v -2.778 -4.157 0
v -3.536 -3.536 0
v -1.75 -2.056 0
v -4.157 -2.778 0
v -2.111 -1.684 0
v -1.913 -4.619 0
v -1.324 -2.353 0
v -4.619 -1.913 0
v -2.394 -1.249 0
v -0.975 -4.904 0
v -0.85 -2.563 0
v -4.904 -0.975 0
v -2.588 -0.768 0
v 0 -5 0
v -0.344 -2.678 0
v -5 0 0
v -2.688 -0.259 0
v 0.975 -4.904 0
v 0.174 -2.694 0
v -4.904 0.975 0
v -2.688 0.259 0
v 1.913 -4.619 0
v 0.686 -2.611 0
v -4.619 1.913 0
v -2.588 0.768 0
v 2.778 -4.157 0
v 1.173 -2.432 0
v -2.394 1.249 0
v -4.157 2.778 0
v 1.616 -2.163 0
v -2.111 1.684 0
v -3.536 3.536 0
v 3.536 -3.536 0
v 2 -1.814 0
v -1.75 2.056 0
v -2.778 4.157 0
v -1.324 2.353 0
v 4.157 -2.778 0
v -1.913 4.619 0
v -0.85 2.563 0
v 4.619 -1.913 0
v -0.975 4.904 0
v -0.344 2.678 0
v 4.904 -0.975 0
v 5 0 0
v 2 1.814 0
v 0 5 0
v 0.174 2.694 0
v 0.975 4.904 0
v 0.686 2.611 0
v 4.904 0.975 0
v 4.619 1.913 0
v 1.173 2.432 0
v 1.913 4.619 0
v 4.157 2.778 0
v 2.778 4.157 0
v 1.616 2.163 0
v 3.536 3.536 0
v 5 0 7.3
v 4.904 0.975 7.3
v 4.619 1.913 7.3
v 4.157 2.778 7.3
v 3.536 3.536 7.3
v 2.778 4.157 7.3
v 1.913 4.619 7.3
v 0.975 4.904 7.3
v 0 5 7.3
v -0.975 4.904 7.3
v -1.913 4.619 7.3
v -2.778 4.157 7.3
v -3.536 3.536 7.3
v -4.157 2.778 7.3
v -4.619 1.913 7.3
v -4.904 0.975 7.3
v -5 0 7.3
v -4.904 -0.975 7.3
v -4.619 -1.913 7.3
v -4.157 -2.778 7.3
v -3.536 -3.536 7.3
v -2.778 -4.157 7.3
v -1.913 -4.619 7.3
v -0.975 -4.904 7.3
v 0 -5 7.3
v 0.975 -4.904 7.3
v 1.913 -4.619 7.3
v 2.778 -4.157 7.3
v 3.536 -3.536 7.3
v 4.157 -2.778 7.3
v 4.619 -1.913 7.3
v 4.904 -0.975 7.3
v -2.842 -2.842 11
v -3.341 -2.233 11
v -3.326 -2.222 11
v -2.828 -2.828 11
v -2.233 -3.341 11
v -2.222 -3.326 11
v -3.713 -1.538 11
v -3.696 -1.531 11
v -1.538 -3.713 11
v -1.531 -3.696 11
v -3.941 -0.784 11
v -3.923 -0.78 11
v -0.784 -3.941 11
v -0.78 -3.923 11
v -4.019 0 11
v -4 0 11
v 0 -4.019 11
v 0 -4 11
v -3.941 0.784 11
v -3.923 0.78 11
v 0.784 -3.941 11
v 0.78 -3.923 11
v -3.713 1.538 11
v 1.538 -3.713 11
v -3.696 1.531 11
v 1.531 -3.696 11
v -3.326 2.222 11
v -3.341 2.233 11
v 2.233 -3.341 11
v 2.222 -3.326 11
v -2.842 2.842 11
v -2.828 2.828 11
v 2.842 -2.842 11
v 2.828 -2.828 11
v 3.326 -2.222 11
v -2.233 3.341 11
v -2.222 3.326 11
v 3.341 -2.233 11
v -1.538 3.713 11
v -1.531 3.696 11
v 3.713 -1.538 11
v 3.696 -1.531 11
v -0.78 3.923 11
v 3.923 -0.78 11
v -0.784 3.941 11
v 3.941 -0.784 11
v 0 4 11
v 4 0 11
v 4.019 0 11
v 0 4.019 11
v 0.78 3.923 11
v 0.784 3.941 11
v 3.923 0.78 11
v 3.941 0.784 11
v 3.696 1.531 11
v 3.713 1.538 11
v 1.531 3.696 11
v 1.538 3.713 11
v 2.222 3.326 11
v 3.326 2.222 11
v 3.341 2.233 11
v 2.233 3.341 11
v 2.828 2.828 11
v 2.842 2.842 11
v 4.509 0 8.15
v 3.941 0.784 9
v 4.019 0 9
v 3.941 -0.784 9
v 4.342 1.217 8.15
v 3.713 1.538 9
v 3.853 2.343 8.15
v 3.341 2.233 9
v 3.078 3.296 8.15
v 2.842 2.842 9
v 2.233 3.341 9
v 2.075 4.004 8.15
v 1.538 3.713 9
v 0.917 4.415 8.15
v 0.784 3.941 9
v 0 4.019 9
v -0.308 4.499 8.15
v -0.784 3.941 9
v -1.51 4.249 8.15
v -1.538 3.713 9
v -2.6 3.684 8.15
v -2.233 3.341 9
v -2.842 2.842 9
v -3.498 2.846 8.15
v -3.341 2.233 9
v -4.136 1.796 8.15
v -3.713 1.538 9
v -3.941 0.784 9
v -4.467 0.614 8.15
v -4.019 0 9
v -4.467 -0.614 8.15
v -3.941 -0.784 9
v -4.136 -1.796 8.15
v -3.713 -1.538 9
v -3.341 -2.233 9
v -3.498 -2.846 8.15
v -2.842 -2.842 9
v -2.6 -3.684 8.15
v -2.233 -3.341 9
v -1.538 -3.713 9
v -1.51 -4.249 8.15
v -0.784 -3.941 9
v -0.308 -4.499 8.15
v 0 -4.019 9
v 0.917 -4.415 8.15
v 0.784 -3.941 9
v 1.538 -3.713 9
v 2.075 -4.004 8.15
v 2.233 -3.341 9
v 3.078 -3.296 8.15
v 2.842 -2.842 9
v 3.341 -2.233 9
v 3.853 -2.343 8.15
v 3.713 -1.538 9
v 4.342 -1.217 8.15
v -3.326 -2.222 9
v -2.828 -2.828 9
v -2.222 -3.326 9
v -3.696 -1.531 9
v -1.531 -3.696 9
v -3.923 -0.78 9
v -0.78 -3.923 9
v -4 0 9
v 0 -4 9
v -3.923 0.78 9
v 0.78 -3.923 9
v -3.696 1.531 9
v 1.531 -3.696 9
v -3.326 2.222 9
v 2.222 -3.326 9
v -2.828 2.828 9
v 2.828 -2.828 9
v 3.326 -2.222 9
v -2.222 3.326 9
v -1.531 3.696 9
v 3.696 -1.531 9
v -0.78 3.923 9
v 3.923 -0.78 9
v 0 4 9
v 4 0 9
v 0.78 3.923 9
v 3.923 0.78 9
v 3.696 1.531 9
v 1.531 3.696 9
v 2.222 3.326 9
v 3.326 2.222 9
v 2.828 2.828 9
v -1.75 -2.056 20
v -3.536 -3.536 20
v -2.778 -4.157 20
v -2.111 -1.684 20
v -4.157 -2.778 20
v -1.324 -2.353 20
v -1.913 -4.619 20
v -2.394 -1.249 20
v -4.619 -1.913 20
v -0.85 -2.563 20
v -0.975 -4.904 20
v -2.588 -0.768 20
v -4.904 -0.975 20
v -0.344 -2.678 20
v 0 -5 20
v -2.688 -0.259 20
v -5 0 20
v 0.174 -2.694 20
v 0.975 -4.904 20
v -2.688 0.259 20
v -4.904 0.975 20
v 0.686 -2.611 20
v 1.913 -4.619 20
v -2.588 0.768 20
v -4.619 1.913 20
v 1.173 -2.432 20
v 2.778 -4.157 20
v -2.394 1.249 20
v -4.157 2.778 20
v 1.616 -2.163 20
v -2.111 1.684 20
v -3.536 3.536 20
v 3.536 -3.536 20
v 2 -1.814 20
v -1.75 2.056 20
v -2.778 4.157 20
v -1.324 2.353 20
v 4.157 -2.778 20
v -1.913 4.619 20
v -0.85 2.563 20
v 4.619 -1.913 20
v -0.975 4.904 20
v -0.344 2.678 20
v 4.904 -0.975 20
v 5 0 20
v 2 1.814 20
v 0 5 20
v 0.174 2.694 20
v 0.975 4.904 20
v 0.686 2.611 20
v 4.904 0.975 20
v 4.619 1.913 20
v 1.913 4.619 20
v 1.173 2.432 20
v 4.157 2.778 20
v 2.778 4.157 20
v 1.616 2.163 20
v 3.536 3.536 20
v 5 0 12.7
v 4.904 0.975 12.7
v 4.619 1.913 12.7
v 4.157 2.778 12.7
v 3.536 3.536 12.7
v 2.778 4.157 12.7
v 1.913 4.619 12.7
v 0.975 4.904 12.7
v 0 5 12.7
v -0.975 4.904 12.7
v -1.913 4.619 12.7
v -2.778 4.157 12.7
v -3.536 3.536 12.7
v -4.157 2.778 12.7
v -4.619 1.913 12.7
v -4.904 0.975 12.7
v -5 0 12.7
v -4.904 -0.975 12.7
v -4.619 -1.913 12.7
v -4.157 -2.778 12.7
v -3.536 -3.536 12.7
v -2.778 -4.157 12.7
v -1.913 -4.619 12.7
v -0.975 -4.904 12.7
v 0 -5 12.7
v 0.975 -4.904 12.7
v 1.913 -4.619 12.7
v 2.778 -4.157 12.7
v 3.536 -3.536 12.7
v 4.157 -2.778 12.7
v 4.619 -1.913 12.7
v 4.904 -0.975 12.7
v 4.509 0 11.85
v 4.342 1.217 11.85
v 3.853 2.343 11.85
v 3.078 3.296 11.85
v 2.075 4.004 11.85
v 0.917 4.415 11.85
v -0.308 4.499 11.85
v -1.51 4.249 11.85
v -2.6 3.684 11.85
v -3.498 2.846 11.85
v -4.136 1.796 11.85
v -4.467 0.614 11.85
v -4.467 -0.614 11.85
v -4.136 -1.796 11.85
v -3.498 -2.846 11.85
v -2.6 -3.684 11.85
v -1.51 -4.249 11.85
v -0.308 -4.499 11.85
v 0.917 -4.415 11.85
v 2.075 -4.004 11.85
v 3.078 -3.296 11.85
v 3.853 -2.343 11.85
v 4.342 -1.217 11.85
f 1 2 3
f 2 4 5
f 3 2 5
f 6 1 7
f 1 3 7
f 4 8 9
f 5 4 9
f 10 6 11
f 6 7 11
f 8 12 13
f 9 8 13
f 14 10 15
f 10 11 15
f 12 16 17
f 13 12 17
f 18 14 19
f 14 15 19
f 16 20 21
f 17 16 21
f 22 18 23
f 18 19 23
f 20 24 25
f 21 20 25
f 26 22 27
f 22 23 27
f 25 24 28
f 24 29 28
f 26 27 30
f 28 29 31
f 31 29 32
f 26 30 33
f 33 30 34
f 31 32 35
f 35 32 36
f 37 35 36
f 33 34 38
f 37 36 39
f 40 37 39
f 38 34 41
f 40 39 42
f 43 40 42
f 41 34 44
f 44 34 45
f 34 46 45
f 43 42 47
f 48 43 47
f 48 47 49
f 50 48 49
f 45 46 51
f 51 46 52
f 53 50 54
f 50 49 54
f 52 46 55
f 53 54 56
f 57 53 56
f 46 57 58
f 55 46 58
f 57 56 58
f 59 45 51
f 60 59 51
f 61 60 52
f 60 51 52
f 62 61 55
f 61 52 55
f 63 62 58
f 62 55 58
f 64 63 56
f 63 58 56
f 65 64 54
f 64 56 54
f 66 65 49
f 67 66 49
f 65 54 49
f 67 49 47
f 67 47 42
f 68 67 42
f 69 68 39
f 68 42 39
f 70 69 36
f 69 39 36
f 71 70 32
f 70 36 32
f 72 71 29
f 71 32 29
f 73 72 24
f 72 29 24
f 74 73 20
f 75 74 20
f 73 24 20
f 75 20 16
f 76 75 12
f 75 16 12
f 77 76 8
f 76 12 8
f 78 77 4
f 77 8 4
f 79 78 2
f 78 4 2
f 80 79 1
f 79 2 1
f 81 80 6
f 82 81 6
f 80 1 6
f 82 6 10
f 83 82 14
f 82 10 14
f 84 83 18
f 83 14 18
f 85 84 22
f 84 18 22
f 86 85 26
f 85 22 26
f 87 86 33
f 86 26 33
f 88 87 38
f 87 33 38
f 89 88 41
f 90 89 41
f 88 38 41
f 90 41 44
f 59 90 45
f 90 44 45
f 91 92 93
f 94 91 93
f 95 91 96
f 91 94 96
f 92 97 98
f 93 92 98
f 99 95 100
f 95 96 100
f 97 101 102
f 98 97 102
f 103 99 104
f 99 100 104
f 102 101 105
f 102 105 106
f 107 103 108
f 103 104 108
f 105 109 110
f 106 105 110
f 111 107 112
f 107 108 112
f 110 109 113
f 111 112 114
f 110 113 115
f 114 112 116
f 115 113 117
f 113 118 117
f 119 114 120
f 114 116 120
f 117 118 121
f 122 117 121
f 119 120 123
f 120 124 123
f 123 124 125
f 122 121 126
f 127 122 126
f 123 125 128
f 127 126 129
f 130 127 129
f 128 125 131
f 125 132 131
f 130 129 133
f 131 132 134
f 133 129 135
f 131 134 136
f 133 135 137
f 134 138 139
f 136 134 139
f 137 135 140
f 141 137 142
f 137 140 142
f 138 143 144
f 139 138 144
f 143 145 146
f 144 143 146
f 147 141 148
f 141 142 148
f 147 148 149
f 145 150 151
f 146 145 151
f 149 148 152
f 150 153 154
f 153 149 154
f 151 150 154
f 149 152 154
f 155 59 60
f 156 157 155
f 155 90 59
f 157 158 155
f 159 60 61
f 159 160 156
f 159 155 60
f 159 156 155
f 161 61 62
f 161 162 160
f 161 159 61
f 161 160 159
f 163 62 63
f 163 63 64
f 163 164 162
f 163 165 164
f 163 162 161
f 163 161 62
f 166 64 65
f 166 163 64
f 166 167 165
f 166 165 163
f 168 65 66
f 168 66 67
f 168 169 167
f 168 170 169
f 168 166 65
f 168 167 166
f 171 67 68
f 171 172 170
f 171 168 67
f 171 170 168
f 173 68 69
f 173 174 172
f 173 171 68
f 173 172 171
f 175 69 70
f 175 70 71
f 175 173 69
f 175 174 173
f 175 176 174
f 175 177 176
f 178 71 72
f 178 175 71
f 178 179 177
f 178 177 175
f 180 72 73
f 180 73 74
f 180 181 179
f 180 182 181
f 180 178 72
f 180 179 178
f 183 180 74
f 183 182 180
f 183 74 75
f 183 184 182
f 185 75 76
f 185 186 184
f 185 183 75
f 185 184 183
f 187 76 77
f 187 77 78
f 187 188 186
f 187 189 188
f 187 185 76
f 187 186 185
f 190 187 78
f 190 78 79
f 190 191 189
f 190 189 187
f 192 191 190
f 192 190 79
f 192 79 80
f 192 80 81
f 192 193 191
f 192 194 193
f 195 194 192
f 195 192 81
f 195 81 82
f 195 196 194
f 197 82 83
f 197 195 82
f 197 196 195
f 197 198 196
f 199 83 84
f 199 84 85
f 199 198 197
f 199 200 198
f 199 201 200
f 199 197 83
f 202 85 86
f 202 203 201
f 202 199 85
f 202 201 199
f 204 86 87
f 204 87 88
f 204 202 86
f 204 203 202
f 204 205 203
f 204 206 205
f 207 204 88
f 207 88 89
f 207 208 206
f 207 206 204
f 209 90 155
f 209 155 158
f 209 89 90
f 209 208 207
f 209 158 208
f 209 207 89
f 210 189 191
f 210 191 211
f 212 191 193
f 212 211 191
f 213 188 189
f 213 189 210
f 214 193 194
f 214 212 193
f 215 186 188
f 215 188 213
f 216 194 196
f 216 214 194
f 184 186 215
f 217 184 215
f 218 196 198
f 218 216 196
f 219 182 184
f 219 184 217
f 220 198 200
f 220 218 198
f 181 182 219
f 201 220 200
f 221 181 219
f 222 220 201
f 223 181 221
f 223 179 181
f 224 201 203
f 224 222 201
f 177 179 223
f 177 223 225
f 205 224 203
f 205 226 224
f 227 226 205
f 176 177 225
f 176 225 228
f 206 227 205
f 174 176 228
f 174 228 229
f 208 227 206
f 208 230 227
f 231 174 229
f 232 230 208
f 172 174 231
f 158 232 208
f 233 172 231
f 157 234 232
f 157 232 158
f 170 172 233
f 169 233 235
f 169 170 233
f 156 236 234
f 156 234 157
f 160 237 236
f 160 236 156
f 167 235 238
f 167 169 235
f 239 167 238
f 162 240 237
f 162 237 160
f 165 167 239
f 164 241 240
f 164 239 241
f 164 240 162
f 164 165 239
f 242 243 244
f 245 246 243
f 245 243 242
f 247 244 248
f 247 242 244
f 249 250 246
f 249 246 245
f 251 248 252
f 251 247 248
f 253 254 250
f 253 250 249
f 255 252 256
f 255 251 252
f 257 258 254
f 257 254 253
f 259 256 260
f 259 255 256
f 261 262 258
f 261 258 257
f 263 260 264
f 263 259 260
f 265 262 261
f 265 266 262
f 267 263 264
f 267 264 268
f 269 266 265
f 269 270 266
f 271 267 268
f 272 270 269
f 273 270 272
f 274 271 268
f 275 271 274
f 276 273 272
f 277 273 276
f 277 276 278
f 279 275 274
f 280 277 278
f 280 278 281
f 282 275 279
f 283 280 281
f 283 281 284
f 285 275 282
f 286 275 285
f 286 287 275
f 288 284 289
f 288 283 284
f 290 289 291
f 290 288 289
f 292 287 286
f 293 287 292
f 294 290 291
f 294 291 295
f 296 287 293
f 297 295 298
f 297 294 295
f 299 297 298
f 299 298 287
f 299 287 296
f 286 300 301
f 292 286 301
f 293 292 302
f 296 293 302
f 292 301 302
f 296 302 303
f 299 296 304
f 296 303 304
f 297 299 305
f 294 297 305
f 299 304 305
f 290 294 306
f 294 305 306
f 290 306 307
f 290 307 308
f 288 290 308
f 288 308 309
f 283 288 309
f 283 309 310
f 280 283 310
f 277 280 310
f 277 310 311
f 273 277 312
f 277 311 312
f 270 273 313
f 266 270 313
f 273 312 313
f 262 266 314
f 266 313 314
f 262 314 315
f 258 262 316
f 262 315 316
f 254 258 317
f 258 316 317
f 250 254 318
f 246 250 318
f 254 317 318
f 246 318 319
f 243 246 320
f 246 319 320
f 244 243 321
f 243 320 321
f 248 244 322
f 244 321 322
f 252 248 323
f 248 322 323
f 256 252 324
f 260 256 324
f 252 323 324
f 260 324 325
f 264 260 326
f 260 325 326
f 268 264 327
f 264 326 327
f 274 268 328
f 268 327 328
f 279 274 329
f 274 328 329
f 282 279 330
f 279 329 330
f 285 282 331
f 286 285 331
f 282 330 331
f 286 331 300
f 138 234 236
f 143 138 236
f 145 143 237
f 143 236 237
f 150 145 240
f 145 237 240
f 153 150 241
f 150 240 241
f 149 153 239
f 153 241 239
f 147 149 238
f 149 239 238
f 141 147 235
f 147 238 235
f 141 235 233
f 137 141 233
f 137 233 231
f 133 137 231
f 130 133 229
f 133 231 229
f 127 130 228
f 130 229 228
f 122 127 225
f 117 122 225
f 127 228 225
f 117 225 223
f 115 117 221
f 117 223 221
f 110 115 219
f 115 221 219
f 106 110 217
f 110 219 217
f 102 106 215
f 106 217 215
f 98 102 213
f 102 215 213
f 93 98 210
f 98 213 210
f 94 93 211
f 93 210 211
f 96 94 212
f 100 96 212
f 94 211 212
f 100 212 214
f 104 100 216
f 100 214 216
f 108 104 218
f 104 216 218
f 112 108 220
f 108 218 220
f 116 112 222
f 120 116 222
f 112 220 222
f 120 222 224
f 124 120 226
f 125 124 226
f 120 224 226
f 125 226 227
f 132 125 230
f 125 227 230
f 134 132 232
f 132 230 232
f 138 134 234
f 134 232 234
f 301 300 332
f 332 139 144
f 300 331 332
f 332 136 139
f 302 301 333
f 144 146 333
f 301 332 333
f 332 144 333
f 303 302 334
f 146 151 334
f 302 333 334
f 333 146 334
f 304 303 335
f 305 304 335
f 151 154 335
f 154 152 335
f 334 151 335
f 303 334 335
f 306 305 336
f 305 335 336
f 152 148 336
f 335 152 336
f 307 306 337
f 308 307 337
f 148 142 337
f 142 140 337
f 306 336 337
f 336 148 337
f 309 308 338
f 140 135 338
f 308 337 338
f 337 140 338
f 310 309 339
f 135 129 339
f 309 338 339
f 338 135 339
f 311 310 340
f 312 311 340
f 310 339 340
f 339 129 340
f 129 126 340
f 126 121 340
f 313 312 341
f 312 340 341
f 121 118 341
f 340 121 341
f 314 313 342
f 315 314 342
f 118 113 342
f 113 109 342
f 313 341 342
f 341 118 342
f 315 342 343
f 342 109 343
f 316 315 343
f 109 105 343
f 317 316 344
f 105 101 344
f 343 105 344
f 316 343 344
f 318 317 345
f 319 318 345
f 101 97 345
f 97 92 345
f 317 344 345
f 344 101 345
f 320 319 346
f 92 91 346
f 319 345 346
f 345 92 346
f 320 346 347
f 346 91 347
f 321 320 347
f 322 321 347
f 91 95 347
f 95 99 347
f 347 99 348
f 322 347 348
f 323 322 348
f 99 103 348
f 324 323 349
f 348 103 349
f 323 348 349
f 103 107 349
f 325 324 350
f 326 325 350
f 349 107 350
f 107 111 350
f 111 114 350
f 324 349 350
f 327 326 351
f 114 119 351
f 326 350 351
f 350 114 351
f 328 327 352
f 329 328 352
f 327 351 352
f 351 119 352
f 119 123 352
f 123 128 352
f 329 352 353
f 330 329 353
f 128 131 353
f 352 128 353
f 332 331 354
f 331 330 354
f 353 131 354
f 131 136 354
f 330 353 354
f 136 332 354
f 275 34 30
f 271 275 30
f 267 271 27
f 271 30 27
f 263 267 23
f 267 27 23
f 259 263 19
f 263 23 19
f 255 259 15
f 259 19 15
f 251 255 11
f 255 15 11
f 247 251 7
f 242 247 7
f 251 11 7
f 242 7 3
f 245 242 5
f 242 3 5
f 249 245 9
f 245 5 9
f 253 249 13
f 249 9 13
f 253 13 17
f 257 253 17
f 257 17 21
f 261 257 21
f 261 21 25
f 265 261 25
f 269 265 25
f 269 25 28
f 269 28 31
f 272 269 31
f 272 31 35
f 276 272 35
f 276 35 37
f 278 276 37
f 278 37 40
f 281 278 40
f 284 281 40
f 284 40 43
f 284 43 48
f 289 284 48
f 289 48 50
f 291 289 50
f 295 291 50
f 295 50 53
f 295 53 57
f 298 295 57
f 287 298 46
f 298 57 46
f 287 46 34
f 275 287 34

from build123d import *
from OCP.BRepFilletAPI import BRepFilletAPI_MakeChamfer

# Parameters (mm, degrees)
SKETCH_3_R          = 5
EXTRUDE_2_DEPTH     = 9
SKETCH_4_R          = 4
EXTRUDE_3_DEPTH     = 2
SKETCH_5_R          = 5
EXTRUDE_4_DEPTH     = 9
CUT_EXTRUDE_5_REACH = 23.213
CHAMFER_2_SIZE      = 1.7
CHAMFER_2_SIZE2     = 0.981495458


with BuildPart() as part:
    # Эскиз3 → Вытянуть2 (new body)
    with BuildSketch(Plane.XY):
        Circle(SKETCH_3_R)
    extrude(amount=EXTRUDE_2_DEPTH)

    # Эскиз4 → Вытянуть3 (add)
    with BuildSketch(Plane.XY.offset(9)):
        Circle(SKETCH_4_R)
    extrude(amount=EXTRUDE_3_DEPTH)

    # Эскиз5 → Вытянуть4 (add)
    with BuildSketch(Plane.XY.offset(11)):
        Circle(SKETCH_5_R)
    extrude(amount=EXTRUDE_4_DEPTH)

    # Эскиз1 → Вытянуть5 (cut, up to next)
    with BuildSketch(Plane.XY, mode=Mode.PRIVATE) as cut_extrude_5_sk1:
        with BuildLine():
            Line((2, 1.813835715), (2, -1.813835715))
            ThreePointArc((2, -1.813835715), (-2.7, 0), (2, 1.813835715))
        make_face()
    cut_extrude_5_tool1 = extrude(cut_extrude_5_sk1.sketch, amount=CUT_EXTRUDE_5_REACH, mode=Mode.PRIVATE) & part.part
    add(cut_extrude_5_tool1.solids().sort_by_distance((-0.188014, 0, 0))[0], mode=Mode.SUBTRACT)

    # Фаска2: one chamfer whose edges measure the first distance from different faces: ONE call of the kernel's chamfer builder (chamfer() names one face for all edges)
    chamfer_2_edges_1 = [part.edges().sort_by_distance(p)[0] for p in [
        (-5, 0, 9),
    ]]
    chamfer_2_side_1 = [part.faces().sort_by_distance(p)[0] for p in [
        (-5, 0, 4.5),
    ]]
    chamfer_2_edges_2 = [part.edges().sort_by_distance(p)[0] for p in [
        (-5, 0, 11),
    ]]
    chamfer_2_side_2 = [part.faces().sort_by_distance(p)[0] for p in [
        (-5, 0, 15.5),
    ]]
    chamfer_2 = BRepFilletAPI_MakeChamfer(part.part.solid().wrapped)
    for e in chamfer_2_edges_1:
        chamfer_2.Add(CHAMFER_2_SIZE, CHAMFER_2_SIZE2, e.wrapped, chamfer_2_side_1[0].wrapped)  # the first distance lies on this face
    for e in chamfer_2_edges_2:
        chamfer_2.Add(CHAMFER_2_SIZE, CHAMFER_2_SIZE2, e.wrapped, chamfer_2_side_2[0].wrapped)  # the first distance lies on this face
    add(Compound.cast(chamfer_2.Shape()), mode=Mode.REPLACE)


solid = part.part
